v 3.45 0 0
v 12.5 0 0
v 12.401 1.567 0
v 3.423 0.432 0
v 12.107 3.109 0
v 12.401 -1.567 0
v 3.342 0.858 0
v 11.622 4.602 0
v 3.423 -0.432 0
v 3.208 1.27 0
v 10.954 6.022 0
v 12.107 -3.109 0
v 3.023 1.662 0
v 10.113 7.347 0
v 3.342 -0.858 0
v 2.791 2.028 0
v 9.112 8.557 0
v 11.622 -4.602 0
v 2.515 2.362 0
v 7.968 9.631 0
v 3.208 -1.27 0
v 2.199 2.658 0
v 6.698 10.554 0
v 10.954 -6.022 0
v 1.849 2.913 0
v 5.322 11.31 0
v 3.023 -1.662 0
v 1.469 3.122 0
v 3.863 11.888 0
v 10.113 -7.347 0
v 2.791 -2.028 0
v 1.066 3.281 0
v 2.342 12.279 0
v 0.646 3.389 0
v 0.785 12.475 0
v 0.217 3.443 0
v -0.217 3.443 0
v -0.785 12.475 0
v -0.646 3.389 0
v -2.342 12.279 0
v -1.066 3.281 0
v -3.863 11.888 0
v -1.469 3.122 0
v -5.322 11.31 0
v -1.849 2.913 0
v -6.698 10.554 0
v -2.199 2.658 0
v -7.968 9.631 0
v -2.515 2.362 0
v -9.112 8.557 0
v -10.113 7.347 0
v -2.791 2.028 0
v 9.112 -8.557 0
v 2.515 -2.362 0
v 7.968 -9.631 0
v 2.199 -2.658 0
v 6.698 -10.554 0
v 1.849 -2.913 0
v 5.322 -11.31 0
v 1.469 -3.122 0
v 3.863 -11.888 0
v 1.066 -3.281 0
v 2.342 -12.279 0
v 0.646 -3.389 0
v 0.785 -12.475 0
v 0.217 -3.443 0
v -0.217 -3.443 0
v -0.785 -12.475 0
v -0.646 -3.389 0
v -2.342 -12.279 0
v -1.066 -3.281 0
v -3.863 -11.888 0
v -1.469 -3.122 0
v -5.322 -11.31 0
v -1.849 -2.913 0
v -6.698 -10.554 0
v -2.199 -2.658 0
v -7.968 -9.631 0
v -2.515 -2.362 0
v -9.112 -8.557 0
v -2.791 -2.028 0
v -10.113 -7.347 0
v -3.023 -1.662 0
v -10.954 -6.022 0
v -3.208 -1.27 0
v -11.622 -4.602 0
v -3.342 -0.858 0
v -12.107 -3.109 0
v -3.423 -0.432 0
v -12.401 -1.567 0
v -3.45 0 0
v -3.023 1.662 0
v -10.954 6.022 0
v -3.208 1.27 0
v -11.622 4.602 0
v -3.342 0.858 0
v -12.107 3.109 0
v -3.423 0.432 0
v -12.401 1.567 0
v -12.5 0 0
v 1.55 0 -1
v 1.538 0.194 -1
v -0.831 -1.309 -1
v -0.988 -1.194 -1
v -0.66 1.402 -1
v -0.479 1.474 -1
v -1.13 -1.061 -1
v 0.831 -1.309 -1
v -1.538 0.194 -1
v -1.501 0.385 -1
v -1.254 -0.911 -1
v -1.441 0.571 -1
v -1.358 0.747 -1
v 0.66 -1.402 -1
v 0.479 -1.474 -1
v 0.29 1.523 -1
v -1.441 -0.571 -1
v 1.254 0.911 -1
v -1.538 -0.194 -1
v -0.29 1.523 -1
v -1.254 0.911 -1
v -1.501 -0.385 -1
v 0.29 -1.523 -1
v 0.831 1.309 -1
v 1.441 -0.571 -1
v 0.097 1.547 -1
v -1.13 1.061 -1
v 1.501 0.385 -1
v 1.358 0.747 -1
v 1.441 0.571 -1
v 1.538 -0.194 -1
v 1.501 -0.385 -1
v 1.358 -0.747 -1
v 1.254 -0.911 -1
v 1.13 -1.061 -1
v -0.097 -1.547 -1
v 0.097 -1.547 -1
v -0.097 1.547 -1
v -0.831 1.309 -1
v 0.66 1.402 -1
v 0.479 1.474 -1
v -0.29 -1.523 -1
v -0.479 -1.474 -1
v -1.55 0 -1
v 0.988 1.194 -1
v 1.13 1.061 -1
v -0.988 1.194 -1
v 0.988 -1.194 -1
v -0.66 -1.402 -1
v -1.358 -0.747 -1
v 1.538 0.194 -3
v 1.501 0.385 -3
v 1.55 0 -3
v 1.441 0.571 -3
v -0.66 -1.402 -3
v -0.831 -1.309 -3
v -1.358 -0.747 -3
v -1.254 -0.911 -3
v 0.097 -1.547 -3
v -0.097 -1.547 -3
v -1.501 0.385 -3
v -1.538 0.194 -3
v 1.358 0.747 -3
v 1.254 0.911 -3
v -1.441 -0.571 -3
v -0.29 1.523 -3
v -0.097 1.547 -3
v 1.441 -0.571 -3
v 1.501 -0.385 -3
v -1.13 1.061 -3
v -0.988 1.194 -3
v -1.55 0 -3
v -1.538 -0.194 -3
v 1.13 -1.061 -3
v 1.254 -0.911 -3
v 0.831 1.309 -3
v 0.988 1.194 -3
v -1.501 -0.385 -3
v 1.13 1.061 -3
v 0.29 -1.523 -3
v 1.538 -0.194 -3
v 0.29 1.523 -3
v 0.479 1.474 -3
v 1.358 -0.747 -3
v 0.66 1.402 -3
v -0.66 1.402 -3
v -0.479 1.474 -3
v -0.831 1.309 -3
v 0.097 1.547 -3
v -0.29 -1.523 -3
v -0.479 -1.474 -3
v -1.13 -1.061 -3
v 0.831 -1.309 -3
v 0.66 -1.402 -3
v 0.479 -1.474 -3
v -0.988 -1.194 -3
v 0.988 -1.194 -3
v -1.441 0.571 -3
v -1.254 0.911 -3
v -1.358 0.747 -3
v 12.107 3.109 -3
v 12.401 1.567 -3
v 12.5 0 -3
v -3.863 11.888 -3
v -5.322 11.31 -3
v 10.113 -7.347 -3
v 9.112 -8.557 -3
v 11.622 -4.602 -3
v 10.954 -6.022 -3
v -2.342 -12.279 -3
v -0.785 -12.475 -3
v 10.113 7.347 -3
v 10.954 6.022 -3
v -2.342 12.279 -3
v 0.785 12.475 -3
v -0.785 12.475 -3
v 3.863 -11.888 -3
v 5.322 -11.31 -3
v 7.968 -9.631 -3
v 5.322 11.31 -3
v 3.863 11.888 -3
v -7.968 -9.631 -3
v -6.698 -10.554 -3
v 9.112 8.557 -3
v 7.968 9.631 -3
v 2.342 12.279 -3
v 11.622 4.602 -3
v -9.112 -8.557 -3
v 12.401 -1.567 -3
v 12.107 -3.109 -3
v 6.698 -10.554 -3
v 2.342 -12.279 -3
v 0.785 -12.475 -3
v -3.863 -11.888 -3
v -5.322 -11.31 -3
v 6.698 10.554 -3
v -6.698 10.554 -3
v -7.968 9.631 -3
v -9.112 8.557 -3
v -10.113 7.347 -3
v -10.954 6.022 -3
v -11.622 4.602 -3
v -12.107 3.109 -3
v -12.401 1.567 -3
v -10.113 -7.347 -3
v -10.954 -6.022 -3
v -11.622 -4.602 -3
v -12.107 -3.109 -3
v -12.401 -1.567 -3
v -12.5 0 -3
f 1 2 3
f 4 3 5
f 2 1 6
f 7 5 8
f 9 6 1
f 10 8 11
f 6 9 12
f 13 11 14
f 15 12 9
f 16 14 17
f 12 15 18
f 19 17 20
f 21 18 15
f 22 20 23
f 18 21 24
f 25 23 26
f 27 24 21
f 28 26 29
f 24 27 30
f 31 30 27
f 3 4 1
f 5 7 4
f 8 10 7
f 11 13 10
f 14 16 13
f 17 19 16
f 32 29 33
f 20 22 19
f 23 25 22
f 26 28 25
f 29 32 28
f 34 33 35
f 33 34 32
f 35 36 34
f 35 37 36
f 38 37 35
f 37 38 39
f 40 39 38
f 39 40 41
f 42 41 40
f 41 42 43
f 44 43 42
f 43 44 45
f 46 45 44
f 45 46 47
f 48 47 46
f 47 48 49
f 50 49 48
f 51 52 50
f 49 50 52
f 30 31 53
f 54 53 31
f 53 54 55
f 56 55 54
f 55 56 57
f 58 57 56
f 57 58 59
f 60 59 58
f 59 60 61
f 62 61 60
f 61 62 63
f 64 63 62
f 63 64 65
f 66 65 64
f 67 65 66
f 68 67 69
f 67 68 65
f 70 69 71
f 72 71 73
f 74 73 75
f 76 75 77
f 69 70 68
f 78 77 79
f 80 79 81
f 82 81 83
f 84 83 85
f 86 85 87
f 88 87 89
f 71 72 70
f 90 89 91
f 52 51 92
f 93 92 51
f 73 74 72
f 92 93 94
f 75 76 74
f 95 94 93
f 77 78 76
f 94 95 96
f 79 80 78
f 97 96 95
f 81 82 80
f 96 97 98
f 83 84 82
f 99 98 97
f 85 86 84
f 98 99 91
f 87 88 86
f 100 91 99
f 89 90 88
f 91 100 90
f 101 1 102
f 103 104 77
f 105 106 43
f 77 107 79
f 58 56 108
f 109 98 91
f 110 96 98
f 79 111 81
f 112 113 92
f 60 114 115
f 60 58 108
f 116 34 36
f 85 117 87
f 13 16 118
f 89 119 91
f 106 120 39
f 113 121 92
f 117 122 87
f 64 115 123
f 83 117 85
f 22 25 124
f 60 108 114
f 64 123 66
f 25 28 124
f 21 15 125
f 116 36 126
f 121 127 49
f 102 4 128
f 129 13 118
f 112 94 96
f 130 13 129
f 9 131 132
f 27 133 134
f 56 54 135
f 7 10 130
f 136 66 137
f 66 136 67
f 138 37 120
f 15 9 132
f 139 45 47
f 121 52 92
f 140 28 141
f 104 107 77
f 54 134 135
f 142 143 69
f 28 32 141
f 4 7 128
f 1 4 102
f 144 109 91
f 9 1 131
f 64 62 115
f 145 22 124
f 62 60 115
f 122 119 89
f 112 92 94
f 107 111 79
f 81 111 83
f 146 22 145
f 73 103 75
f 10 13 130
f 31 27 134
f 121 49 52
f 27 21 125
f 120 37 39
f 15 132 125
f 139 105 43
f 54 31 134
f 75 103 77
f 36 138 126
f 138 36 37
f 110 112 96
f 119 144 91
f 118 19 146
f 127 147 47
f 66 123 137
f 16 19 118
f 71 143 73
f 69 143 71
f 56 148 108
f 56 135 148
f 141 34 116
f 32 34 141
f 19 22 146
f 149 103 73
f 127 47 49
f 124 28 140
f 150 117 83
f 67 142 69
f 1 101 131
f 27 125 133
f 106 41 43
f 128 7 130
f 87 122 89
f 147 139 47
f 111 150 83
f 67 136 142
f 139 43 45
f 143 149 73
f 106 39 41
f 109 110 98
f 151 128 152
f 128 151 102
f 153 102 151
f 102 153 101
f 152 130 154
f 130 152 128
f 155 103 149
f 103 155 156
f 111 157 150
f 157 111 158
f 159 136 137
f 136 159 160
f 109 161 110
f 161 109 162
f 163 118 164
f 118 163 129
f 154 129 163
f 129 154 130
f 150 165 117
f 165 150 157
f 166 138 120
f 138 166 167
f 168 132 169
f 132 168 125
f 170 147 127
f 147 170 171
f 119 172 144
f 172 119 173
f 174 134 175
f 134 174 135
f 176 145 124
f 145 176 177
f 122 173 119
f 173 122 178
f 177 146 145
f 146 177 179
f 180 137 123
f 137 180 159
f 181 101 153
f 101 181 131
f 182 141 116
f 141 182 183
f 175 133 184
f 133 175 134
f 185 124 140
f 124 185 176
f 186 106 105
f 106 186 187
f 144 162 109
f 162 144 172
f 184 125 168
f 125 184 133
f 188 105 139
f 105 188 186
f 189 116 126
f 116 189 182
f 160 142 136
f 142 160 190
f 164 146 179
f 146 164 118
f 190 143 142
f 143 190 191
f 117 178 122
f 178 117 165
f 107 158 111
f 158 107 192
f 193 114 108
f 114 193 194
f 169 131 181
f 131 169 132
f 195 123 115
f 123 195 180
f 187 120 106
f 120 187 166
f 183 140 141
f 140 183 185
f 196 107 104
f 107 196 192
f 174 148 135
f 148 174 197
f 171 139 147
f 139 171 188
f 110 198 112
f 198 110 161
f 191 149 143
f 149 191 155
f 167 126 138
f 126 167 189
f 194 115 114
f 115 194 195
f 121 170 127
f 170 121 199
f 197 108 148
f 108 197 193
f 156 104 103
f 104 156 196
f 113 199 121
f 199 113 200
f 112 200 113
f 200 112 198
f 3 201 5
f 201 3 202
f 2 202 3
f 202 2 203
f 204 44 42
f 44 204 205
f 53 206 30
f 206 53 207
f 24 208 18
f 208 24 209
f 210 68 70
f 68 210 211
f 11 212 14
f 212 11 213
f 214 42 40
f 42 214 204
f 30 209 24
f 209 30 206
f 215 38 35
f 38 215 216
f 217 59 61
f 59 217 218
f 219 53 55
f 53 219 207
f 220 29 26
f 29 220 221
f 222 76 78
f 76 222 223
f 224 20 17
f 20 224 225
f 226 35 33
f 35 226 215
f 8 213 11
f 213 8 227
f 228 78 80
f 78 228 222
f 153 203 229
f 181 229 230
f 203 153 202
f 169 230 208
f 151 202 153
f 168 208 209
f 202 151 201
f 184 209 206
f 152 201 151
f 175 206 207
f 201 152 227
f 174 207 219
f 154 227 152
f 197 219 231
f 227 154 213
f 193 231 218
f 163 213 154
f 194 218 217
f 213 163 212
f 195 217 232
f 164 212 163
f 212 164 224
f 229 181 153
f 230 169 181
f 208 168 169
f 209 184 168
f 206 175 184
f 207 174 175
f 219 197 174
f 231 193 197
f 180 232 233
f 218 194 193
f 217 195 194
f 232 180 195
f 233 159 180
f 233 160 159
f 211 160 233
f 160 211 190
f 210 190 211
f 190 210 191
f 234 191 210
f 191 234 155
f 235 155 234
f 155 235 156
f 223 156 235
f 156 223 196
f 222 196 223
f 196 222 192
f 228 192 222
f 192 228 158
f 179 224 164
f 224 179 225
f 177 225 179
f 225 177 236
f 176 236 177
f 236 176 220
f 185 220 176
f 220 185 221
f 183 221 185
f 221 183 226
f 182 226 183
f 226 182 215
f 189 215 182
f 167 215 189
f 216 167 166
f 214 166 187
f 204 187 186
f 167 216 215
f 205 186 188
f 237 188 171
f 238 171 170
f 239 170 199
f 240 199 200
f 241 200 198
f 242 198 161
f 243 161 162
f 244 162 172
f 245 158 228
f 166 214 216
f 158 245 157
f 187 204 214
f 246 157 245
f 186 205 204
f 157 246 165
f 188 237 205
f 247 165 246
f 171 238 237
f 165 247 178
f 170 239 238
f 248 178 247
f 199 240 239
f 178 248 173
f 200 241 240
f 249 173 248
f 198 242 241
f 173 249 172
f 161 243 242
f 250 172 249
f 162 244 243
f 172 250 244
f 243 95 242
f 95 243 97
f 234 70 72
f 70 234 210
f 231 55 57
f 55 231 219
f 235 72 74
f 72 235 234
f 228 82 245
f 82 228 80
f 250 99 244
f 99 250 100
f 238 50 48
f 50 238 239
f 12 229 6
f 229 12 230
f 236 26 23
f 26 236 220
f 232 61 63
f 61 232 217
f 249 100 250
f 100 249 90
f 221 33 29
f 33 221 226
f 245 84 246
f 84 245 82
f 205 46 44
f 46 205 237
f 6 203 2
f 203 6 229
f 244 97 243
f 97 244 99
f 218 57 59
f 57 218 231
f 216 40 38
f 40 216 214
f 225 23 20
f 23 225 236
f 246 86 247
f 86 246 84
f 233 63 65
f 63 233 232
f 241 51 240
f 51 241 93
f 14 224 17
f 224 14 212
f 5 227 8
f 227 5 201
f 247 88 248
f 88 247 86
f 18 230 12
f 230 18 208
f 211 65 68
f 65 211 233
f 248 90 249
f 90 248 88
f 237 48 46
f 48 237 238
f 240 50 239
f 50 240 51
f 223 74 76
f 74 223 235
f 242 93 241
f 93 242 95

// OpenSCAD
$fn = 50;


difference() {
	union() {
		translate(v = [0, 0, -3.0000000000]) {
			cylinder(h = 3, r = 12.5000000000);
		}
	}
	union() {
		translate(v = [0, 0, 0]) {
			rotate(a = [0, 0, 0]) {
				difference() {
					union() {
						translate(v = [0, 0, -6.0000000000]) {
							cylinder(h = 6, r = 1.2500000000);
						}
						translate(v = [0, 0, -1.0000000000]) {
							cylinder(h = 1.0000000000, r1 = 1.5500000000, r2 = 3.4500000000);
						}
						translate(v = [0, 0, -6.0000000000]) {
							cylinder(h = 6, r = 1.5500000000);
						}
						translate(v = [0, 0, -6.0000000000]) {
							cylinder(h = 6, r = 1.2500000000);
						}
					}
					union();
				}
			}
		}
	}
}
